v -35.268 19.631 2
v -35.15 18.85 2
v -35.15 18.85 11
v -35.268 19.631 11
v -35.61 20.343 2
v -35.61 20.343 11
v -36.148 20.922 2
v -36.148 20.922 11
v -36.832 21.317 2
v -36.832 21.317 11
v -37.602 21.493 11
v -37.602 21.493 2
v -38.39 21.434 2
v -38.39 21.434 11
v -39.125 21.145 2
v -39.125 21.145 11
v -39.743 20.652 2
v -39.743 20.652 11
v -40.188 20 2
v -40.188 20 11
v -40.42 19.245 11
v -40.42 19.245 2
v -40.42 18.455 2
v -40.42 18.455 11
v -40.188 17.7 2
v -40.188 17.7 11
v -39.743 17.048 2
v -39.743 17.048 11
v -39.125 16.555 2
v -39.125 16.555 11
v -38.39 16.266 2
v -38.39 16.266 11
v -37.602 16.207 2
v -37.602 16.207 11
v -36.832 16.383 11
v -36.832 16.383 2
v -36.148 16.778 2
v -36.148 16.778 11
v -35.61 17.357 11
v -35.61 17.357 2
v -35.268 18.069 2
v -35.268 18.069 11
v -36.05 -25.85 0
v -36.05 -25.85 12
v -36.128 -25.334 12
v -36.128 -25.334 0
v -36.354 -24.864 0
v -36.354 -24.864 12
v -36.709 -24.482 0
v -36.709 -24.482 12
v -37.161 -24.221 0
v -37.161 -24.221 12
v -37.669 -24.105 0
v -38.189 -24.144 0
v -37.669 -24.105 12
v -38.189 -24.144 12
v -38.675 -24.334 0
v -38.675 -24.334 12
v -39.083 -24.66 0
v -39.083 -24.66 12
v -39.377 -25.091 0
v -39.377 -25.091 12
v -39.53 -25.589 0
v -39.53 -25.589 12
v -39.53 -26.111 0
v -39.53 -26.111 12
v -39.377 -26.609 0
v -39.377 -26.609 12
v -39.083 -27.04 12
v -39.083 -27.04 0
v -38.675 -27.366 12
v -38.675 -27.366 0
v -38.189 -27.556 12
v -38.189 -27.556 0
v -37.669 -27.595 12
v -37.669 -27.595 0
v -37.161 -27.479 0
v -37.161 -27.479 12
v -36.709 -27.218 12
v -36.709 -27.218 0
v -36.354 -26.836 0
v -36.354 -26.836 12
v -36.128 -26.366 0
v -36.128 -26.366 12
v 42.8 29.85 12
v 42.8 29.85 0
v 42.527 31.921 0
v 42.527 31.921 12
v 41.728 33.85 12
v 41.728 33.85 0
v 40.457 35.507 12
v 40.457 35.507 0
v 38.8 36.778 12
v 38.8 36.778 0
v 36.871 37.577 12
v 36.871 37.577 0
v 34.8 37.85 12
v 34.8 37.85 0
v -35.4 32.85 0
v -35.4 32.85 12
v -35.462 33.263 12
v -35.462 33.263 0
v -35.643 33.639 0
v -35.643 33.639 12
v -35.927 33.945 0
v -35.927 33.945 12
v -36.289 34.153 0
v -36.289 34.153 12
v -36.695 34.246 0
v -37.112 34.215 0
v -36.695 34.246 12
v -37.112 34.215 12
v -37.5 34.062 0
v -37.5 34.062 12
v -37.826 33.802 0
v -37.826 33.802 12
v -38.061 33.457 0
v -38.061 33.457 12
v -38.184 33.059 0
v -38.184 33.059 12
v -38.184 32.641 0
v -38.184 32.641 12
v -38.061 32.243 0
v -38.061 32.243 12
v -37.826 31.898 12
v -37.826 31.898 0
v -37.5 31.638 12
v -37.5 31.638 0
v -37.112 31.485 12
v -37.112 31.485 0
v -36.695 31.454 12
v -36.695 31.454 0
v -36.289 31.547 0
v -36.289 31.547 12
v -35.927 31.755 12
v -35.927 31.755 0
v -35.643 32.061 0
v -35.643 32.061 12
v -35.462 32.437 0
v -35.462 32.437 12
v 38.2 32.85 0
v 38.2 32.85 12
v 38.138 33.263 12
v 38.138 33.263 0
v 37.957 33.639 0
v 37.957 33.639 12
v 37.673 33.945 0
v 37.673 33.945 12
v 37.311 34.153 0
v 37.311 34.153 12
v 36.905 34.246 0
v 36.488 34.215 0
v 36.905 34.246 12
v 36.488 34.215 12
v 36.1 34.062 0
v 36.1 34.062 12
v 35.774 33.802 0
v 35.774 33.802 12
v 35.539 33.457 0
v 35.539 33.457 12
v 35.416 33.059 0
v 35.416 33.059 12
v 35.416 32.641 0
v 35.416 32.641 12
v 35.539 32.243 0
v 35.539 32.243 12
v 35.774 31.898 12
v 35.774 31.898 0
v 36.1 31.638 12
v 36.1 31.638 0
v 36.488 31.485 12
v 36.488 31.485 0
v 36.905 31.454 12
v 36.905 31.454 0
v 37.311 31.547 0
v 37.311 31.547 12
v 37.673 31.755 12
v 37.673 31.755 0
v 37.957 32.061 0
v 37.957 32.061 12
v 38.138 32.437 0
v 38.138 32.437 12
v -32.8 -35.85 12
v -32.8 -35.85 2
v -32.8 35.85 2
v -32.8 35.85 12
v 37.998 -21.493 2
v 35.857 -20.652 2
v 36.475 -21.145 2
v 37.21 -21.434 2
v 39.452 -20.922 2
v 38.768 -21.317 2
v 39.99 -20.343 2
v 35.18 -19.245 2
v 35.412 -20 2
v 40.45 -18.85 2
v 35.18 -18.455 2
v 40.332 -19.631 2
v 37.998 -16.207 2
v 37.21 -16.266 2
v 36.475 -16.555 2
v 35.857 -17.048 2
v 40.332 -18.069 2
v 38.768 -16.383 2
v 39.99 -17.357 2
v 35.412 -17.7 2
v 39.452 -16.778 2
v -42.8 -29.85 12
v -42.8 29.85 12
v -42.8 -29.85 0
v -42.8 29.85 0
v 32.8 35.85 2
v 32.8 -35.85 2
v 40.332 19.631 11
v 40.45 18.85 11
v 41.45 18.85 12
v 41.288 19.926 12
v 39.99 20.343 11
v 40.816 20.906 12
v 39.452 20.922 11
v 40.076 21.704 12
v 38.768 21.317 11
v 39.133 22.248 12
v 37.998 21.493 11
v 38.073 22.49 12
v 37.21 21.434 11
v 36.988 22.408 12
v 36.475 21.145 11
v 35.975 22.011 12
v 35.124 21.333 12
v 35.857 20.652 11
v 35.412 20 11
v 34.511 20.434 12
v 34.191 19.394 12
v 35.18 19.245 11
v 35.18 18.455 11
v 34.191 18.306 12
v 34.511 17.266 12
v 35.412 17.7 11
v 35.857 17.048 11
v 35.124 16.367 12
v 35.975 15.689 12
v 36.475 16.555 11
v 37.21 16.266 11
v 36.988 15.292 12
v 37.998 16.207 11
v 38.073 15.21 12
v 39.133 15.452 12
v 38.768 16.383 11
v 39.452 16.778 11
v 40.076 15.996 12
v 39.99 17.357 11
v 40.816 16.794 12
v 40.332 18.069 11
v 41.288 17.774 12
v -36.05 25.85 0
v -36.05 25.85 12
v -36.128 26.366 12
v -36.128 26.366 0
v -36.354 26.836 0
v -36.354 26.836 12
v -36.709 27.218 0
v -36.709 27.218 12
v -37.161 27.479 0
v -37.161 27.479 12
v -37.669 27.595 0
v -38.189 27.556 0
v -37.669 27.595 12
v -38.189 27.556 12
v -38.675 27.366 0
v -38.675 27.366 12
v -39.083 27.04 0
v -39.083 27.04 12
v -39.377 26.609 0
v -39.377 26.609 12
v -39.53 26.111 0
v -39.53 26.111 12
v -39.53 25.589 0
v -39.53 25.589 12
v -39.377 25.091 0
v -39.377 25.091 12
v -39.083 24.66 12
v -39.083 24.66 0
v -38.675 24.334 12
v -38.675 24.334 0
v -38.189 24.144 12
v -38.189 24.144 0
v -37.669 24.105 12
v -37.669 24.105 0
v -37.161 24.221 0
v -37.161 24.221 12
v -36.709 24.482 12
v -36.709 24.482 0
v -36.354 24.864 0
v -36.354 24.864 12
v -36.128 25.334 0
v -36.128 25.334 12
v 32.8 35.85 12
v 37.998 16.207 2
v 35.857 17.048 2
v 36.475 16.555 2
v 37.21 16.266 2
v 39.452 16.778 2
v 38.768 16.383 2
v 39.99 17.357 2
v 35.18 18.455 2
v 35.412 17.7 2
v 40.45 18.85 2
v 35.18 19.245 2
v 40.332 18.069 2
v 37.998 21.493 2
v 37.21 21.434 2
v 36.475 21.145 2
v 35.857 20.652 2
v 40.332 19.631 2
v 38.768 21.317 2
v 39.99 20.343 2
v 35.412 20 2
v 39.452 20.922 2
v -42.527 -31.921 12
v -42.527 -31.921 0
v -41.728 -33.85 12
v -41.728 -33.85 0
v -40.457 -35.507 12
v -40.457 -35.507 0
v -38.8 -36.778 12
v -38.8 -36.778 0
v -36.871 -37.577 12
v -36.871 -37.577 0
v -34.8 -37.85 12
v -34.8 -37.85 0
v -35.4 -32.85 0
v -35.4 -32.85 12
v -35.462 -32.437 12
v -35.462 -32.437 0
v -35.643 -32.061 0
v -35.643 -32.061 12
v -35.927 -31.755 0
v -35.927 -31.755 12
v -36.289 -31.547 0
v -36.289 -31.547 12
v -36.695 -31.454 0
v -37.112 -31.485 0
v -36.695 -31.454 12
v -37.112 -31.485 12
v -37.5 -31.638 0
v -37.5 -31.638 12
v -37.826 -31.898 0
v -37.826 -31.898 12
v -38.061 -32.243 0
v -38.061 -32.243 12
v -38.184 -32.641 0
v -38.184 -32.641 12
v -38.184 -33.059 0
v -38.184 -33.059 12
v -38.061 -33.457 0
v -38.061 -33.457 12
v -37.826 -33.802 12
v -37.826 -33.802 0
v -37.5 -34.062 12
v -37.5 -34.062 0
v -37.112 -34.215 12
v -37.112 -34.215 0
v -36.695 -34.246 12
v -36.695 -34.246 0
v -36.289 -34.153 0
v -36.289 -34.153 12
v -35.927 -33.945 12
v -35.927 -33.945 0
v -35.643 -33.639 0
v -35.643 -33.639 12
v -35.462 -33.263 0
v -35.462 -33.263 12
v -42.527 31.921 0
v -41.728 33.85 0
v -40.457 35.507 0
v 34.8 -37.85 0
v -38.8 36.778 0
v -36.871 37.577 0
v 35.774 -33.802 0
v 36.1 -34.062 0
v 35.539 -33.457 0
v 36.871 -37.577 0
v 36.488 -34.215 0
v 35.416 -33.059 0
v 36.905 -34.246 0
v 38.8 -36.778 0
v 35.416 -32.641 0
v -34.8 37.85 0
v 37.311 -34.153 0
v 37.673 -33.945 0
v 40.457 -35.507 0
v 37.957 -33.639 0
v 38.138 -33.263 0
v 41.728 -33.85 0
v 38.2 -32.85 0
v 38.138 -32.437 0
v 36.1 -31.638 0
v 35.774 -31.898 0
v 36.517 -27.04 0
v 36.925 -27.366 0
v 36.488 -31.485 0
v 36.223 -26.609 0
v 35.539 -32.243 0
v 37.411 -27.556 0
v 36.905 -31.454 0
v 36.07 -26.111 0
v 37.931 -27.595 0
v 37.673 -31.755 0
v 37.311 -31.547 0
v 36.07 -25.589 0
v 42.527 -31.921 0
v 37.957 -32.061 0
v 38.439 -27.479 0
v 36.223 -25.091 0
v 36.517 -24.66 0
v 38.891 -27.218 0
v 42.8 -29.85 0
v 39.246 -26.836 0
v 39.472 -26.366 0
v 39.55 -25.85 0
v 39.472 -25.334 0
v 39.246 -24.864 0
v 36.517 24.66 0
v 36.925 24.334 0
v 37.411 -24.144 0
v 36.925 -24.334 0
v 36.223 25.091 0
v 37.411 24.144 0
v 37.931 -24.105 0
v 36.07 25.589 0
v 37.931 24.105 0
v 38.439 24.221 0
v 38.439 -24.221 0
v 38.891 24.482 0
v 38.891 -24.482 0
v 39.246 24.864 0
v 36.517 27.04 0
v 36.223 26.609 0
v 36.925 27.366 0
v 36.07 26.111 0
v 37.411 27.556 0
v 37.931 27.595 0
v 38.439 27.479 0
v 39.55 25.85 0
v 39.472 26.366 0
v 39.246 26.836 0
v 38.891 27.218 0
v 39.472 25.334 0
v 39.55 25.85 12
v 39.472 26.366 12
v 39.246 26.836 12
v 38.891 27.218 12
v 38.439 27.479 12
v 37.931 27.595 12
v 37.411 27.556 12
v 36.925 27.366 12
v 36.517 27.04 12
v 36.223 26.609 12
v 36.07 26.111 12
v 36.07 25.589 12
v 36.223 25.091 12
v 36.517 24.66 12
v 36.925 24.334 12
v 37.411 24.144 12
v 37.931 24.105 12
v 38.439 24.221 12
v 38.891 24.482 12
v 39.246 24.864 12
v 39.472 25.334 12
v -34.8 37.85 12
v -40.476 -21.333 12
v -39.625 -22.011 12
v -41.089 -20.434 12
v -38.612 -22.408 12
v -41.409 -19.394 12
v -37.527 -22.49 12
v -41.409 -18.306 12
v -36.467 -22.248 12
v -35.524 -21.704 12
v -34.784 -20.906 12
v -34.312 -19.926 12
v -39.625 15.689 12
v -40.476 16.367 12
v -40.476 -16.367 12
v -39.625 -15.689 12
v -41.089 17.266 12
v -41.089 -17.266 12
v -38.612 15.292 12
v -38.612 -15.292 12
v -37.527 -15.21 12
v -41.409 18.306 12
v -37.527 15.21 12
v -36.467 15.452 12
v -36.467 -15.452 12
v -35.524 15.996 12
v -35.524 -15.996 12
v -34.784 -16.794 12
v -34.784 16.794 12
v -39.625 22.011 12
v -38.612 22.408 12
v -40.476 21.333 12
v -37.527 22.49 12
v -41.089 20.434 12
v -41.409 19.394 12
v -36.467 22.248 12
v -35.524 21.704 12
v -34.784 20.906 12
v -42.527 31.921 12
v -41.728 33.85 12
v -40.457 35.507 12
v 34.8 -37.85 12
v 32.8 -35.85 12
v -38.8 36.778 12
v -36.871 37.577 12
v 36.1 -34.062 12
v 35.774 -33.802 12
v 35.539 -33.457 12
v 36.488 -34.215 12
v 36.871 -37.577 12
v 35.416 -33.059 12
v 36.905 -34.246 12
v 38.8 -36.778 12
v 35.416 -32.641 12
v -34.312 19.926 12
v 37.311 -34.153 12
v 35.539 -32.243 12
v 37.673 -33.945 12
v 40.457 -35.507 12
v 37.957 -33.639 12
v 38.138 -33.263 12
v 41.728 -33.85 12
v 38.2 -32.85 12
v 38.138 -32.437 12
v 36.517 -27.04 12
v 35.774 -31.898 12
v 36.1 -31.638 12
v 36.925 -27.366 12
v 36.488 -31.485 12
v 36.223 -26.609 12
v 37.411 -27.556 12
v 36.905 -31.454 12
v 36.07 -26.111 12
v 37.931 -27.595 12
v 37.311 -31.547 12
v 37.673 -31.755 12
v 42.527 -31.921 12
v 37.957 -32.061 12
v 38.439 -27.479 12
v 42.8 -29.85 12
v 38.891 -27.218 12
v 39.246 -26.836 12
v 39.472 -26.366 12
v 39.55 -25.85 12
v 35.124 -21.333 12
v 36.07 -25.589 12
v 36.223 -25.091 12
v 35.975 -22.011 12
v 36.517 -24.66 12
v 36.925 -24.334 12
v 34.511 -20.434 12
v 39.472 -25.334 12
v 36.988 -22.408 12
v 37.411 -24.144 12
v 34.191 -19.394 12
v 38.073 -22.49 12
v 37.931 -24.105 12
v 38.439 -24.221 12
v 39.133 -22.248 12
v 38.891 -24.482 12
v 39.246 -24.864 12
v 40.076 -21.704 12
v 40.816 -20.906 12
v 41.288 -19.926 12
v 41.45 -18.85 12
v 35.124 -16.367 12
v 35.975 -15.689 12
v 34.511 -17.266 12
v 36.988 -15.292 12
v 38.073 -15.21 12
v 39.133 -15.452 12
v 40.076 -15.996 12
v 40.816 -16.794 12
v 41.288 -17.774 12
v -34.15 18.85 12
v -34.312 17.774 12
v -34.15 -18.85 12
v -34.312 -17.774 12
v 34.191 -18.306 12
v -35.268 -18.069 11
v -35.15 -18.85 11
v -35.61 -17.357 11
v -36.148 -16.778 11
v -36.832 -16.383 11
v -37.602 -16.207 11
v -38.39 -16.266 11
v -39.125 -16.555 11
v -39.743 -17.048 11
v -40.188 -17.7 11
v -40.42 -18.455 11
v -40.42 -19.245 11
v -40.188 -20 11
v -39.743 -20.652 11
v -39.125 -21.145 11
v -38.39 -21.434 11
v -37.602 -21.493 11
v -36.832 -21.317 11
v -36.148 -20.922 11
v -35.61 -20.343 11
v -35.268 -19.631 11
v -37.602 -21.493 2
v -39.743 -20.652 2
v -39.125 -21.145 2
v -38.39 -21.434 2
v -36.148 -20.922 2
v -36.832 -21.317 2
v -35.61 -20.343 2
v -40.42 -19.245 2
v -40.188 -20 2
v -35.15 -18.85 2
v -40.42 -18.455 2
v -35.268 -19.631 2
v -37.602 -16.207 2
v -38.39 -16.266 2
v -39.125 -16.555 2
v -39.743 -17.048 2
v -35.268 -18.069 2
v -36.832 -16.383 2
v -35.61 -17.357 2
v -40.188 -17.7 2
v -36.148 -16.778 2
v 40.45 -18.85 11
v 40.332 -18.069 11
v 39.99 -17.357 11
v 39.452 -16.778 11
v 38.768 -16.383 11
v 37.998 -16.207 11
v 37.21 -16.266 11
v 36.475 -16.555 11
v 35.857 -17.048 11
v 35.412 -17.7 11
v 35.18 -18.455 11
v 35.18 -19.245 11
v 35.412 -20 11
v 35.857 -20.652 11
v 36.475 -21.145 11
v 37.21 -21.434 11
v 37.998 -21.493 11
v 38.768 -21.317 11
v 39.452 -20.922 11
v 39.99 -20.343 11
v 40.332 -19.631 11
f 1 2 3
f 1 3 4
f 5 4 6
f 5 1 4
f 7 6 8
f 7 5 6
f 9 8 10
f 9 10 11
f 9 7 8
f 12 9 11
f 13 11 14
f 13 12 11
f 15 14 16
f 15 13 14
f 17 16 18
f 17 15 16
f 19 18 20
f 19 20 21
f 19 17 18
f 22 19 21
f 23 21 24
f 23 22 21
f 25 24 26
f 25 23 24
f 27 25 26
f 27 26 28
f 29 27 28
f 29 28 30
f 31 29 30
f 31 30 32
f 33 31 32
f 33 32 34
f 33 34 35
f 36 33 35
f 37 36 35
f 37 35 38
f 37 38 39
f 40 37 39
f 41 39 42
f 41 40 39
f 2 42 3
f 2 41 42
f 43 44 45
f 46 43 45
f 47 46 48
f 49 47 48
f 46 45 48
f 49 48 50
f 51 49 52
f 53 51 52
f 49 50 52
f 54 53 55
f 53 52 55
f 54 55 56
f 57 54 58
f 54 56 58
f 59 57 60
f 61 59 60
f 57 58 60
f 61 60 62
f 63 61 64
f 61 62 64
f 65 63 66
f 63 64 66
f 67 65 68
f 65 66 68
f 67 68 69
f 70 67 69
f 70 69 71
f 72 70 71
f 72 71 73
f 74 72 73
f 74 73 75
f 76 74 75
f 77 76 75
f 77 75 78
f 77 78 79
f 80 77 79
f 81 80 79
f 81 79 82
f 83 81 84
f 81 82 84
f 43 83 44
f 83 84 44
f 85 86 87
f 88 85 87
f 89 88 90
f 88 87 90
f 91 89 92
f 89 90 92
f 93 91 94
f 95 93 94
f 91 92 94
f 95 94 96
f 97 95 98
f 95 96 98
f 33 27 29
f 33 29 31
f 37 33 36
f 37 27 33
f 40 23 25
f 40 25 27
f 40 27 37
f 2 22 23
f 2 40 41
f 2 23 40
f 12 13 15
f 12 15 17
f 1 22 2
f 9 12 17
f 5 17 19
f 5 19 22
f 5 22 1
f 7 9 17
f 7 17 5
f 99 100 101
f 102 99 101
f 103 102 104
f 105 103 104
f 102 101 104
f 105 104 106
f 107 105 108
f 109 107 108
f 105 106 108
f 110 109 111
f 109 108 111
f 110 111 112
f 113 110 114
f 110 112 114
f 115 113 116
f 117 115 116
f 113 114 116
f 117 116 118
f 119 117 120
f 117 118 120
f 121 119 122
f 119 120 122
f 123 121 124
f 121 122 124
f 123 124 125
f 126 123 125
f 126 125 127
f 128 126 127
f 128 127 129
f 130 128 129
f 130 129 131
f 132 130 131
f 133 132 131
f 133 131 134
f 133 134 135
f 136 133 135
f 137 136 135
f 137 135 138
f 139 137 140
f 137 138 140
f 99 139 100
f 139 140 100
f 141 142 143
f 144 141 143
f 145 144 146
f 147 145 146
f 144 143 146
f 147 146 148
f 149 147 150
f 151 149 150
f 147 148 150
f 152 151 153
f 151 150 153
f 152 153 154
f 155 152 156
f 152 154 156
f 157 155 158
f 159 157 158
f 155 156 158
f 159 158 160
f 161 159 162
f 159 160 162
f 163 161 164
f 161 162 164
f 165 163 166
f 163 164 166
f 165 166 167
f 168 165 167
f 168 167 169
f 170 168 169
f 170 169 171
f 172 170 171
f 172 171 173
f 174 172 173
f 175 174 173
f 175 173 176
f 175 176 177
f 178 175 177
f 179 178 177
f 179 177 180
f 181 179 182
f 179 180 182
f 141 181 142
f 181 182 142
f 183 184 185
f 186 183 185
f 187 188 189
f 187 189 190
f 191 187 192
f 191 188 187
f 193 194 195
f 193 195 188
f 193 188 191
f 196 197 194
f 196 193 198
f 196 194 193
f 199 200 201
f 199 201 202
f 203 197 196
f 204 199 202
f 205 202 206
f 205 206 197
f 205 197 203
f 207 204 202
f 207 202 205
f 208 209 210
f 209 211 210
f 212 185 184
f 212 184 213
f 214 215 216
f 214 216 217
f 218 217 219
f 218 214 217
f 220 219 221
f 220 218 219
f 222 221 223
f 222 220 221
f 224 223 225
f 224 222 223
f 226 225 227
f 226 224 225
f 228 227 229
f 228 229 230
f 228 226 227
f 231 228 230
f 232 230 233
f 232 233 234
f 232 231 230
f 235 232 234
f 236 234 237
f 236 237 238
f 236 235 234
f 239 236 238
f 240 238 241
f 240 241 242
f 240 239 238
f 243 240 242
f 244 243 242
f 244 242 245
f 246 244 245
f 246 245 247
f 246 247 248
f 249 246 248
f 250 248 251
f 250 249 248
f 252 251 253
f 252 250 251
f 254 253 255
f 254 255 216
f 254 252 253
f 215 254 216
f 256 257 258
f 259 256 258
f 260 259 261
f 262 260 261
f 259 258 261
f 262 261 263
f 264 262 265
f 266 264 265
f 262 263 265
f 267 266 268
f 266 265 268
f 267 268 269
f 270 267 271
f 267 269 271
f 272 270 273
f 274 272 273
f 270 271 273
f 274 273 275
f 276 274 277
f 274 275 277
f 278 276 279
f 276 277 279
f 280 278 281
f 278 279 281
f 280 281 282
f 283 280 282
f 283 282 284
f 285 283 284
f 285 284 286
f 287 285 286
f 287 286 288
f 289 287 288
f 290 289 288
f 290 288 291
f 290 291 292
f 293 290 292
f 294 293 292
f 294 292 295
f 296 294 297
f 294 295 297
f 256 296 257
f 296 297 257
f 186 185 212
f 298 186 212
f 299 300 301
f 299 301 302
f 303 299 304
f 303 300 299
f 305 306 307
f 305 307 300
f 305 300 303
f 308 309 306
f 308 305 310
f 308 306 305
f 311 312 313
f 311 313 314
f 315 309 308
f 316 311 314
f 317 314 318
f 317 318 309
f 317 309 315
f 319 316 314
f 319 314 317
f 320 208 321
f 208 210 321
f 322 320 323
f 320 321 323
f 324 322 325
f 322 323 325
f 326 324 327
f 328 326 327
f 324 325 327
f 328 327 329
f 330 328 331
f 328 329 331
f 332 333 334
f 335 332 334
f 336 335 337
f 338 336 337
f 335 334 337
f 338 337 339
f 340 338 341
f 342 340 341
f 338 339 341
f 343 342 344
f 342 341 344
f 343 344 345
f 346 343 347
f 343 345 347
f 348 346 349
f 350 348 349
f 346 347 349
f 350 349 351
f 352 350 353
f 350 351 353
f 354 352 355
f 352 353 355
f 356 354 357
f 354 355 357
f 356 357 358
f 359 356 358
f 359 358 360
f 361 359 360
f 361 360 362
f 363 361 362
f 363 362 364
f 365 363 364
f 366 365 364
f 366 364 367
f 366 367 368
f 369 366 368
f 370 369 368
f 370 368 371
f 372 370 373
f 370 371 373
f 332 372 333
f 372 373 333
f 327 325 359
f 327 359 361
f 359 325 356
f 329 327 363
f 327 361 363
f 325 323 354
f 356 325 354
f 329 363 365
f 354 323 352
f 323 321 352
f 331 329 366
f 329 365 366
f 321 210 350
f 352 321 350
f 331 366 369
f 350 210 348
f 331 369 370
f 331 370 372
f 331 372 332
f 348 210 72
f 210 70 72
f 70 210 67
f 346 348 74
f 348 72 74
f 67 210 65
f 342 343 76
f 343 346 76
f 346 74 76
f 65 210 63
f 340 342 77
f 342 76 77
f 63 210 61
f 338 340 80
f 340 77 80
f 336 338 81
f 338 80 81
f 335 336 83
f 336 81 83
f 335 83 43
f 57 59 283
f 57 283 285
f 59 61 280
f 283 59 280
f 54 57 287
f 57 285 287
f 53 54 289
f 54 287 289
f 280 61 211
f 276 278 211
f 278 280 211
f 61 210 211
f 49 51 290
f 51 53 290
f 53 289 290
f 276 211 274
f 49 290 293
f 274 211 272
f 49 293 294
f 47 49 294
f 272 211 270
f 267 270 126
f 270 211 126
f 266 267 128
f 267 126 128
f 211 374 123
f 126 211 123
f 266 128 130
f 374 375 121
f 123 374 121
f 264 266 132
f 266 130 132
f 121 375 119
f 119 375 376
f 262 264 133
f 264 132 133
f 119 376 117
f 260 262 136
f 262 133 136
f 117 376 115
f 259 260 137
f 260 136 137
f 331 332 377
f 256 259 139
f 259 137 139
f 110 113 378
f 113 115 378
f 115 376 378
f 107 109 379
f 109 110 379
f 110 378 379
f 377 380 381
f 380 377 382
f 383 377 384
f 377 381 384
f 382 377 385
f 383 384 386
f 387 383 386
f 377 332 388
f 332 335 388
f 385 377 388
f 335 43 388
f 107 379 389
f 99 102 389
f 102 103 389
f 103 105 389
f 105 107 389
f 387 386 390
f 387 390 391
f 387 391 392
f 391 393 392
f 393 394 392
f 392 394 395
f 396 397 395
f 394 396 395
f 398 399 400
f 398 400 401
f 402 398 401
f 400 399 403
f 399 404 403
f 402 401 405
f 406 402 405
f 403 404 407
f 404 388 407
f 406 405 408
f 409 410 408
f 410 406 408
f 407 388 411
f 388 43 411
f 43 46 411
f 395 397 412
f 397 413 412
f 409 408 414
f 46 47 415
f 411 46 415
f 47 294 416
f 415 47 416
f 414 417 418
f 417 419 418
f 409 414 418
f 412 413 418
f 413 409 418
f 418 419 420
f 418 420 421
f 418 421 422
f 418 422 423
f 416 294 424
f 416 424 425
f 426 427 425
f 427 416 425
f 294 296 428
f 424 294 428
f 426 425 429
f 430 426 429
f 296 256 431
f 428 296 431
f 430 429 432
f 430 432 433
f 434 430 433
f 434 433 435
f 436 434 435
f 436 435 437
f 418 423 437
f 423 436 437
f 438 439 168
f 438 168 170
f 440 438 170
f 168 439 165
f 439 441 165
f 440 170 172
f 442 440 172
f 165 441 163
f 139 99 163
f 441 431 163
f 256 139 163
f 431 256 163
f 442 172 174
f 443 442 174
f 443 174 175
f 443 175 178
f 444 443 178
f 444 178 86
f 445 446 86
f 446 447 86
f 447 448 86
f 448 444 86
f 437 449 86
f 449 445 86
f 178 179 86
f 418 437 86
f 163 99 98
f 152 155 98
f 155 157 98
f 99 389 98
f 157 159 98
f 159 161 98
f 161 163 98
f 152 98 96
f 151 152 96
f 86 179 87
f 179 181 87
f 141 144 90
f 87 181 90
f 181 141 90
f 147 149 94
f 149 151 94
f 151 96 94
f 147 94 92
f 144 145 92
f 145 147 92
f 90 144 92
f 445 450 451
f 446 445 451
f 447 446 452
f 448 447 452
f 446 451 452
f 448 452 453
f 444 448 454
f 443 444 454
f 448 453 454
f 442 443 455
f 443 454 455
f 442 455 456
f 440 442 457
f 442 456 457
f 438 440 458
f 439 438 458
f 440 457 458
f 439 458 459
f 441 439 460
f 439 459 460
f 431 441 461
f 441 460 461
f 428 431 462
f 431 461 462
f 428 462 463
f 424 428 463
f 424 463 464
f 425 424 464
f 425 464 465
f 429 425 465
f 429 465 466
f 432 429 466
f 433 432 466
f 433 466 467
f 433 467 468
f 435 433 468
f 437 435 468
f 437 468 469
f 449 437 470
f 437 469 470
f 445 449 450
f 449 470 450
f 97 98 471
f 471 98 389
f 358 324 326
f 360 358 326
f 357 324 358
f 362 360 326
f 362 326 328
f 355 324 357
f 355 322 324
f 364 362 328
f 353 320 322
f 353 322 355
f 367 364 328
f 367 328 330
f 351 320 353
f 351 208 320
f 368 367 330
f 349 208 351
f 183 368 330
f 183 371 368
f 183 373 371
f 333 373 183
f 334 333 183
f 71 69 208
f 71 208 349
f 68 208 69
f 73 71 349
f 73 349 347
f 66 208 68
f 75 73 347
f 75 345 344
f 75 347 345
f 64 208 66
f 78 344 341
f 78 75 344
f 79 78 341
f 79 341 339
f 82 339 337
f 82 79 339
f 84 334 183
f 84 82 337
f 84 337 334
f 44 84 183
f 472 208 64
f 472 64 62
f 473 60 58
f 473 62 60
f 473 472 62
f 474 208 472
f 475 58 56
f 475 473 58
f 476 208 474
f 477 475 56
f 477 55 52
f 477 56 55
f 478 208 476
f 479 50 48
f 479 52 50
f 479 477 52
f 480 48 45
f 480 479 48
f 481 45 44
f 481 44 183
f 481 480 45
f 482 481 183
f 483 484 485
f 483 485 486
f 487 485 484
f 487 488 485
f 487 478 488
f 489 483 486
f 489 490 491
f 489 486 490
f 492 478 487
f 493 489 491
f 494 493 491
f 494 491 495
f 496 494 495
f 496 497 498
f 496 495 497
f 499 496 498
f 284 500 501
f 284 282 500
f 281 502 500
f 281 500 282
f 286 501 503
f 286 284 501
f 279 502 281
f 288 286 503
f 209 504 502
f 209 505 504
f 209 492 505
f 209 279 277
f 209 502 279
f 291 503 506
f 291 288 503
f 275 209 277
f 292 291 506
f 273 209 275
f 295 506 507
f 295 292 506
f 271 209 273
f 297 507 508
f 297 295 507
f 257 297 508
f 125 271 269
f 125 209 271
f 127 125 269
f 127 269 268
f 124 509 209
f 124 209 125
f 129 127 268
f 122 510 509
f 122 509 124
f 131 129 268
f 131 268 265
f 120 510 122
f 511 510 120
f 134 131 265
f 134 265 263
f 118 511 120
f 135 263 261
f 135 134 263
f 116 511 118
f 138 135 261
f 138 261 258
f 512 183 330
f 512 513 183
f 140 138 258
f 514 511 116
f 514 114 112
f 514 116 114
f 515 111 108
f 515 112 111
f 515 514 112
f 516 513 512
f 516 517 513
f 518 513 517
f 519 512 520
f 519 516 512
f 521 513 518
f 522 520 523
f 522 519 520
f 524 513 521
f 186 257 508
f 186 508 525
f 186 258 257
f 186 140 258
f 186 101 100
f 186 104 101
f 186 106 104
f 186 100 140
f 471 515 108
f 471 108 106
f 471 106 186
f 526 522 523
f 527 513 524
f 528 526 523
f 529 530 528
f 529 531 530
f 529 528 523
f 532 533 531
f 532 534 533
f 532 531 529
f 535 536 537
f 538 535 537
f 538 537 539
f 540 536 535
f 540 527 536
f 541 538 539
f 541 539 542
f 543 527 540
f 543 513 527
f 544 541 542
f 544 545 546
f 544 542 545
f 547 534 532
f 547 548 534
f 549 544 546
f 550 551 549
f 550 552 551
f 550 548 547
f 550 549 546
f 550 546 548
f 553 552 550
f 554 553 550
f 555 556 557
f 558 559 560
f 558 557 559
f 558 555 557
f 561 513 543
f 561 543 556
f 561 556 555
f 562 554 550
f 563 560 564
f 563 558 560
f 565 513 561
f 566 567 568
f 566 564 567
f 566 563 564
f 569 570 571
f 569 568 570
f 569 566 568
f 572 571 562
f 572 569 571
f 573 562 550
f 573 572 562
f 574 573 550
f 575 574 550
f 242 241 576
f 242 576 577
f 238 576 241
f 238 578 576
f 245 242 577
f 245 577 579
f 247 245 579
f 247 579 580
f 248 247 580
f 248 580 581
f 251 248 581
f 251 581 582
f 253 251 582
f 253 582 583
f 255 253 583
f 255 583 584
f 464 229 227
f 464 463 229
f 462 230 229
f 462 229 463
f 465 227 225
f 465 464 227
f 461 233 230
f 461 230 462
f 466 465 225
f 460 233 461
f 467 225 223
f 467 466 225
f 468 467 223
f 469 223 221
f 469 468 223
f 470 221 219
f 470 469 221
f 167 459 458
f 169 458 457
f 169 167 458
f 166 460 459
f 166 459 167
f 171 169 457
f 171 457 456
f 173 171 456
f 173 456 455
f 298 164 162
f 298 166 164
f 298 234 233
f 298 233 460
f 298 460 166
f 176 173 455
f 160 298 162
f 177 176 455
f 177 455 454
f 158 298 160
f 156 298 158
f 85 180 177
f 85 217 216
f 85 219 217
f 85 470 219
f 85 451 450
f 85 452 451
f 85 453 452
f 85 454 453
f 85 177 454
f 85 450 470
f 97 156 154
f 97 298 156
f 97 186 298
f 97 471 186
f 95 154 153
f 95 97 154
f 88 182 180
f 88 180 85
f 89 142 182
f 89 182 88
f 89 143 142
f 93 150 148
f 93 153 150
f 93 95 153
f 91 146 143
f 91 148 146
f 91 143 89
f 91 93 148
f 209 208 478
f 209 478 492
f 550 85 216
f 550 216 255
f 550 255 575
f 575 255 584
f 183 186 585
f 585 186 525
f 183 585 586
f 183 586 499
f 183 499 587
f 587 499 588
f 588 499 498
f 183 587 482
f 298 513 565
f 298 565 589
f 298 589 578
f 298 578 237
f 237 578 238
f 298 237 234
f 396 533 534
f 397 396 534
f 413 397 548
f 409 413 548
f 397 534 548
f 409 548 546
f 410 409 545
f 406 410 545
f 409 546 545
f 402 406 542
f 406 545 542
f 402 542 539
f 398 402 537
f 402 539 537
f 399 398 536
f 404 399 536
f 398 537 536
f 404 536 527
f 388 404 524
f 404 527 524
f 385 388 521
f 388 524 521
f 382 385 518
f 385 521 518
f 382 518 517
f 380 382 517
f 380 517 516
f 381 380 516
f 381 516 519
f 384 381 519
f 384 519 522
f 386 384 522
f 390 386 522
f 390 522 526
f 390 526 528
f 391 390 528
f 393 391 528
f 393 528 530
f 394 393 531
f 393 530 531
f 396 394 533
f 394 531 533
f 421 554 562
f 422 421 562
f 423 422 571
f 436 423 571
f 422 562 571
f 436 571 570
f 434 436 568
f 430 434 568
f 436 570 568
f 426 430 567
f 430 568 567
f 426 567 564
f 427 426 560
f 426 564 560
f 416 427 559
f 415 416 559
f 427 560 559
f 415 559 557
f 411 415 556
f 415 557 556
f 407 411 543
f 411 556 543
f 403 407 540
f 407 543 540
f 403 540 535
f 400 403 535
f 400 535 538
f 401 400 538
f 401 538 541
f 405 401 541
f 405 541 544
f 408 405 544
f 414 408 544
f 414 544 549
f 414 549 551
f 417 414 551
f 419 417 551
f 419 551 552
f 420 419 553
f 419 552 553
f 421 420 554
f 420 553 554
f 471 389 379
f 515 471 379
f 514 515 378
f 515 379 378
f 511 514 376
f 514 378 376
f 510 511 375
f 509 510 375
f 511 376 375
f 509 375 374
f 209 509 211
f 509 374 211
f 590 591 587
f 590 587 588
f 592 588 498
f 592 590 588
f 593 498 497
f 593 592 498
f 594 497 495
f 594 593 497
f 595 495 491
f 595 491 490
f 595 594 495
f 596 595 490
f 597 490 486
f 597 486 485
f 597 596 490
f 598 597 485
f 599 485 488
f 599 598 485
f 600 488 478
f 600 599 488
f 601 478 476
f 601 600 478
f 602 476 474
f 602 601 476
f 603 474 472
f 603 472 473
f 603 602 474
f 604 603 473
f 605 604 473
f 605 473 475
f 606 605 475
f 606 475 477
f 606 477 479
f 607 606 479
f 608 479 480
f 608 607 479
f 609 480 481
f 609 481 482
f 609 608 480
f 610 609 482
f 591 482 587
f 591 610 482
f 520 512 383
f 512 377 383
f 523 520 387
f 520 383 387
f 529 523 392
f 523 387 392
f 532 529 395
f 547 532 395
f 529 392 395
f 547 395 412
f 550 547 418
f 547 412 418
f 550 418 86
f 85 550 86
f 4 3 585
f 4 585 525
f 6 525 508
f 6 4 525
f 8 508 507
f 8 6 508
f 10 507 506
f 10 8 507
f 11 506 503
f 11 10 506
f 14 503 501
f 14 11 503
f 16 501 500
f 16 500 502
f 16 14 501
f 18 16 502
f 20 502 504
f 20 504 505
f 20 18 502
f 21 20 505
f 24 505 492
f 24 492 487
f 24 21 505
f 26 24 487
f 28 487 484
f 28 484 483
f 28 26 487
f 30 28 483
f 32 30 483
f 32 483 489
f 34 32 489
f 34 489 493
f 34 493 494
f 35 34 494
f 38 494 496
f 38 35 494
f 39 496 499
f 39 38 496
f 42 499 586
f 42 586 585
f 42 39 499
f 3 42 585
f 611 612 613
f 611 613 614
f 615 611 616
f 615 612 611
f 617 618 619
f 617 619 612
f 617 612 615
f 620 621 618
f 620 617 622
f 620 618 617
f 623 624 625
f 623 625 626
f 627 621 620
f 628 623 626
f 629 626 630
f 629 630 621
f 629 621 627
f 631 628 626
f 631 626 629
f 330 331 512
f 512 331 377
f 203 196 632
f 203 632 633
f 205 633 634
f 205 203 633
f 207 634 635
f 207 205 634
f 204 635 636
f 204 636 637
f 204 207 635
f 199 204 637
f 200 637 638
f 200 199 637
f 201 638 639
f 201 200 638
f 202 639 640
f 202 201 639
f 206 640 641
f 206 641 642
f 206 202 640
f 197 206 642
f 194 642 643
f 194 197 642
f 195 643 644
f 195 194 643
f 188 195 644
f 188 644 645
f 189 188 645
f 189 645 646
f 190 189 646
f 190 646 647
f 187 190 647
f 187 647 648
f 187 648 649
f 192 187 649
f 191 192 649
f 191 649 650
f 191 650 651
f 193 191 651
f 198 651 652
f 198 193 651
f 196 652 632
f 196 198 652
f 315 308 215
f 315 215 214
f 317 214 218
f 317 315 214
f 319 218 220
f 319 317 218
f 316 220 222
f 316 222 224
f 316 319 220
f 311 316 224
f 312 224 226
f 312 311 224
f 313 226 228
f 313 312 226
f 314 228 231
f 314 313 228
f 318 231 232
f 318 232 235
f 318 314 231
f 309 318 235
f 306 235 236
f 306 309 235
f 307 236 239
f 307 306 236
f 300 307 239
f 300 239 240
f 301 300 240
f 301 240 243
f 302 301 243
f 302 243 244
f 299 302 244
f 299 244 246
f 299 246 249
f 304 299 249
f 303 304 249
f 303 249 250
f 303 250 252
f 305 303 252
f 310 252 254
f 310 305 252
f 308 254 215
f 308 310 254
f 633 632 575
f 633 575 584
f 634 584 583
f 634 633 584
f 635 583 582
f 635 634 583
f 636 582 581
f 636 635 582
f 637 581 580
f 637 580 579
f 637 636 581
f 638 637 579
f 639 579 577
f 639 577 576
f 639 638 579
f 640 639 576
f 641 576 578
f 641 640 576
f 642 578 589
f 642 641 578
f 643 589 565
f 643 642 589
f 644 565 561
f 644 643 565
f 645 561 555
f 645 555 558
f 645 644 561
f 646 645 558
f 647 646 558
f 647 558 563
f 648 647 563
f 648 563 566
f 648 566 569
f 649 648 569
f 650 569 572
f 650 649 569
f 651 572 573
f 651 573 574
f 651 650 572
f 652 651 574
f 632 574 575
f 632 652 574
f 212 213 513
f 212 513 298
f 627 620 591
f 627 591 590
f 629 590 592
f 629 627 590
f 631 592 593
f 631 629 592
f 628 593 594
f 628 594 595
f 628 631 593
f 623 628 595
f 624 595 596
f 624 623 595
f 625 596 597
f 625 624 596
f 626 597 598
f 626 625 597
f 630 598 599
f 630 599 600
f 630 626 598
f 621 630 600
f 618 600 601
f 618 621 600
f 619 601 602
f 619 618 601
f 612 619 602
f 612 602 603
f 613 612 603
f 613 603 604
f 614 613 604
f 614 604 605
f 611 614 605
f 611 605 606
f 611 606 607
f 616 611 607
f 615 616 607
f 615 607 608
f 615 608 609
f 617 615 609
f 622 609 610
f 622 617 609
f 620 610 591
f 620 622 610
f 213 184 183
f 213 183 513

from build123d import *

# Parameters (mm, degrees)
F1_DEPTH = 2
F2_R     = 2.65
F2_W     = 65.6
F2_H     = 71.7
F3_DEPTH = 10
F4_R     = 1.4
F4_R_2   = 1.75
F5_DEPTH = 12
F6_SIZE  = 1


with BuildPart() as f1:
    # F0 (on Top) → F1 (new body)
    with BuildSketch(Plane.XY):
        with BuildLine():
            Line((34.8, 37.85), (-34.8, 37.85))
            ThreePointArc((-34.8, 37.85), (-40.456854, 35.506854), (-42.8, 29.85))
            Line((-42.8, 29.85), (-42.8, -29.85))
            ThreePointArc((-42.8, -29.85), (-40.456854, -35.506854), (-34.8, -37.85))
            Line((-34.8, -37.85), (34.8, -37.85))
            ThreePointArc((34.8, -37.85), (40.456854, -35.506854), (42.8, -29.85))
            Line((42.8, -29.85), (42.8, 29.85))
            ThreePointArc((42.8, 29.85), (40.456854, 35.506854), (34.8, 37.85))
        make_face()
    extrude(amount=F1_DEPTH)

    # F2 (on face) → F3 (join)
    with BuildSketch(Plane.XY.offset(2)):
        with BuildLine():
            ThreePointArc((-34.8, 37.85), (-40.456854, 35.506854), (-42.8, 29.85))
            Line((-42.8, 29.85), (-42.8, -29.85))
            ThreePointArc((-42.8, -29.85), (-40.456854, -35.506854), (-34.8, -37.85))
            Line((-34.8, -37.85), (34.8, -37.85))
            ThreePointArc((34.8, -37.85), (40.456854, -35.506854), (42.8, -29.85))
            Line((42.8, -29.85), (42.8, 29.85))
            ThreePointArc((42.8, 29.85), (40.456854, 35.506854), (34.8, 37.85))
            Line((34.8, 37.85), (-34.8, 37.85))
        make_face()
        with Locations((-37.8, -18.85)):
            Circle(F2_R, mode=Mode.SUBTRACT)
        with Locations((37.8, -18.85)):
            Circle(F2_R, mode=Mode.SUBTRACT)
        with Locations((-37.8, 18.85)):
            Circle(F2_R, mode=Mode.SUBTRACT)
        Rectangle(F2_W, F2_H, mode=Mode.SUBTRACT)
        with Locations((37.8, 18.85)):
            Circle(F2_R, mode=Mode.SUBTRACT)
    extrude(amount=F3_DEPTH)

    # F4 (on face) → F5 (cut, through all)
    with BuildSketch(Plane.XY.offset(12)):
        with Locations((-36.8, -32.85)):
            Circle(F4_R)
        with Locations((36.8, -32.85)):
            Circle(F4_R)
        with Locations((-36.8, 32.85)):
            Circle(F4_R)
        with Locations((36.8, 32.85)):
            Circle(F4_R)
        with Locations((-37.8, -25.85)):
            Circle(F4_R_2)
        with Locations((37.8, -25.85)):
            Circle(F4_R_2)
        with Locations((-37.8, 25.85)):
            Circle(F4_R_2)
        with Locations((37.8, 25.85)):
            Circle(F4_R_2)
    extrude(amount=-F5_DEPTH, mode=Mode.SUBTRACT)

    # F6
    f6_edges = [f1.edges().sort_by_distance(p)[0] for p in [
        (-40.45, 18.85, 12),
        (35.15, 18.85, 12),
        (35.15, -18.85, 12),
        (-40.45, -18.85, 12),
    ]]
    chamfer(f6_edges, length=F6_SIZE)


solid = f1.part
